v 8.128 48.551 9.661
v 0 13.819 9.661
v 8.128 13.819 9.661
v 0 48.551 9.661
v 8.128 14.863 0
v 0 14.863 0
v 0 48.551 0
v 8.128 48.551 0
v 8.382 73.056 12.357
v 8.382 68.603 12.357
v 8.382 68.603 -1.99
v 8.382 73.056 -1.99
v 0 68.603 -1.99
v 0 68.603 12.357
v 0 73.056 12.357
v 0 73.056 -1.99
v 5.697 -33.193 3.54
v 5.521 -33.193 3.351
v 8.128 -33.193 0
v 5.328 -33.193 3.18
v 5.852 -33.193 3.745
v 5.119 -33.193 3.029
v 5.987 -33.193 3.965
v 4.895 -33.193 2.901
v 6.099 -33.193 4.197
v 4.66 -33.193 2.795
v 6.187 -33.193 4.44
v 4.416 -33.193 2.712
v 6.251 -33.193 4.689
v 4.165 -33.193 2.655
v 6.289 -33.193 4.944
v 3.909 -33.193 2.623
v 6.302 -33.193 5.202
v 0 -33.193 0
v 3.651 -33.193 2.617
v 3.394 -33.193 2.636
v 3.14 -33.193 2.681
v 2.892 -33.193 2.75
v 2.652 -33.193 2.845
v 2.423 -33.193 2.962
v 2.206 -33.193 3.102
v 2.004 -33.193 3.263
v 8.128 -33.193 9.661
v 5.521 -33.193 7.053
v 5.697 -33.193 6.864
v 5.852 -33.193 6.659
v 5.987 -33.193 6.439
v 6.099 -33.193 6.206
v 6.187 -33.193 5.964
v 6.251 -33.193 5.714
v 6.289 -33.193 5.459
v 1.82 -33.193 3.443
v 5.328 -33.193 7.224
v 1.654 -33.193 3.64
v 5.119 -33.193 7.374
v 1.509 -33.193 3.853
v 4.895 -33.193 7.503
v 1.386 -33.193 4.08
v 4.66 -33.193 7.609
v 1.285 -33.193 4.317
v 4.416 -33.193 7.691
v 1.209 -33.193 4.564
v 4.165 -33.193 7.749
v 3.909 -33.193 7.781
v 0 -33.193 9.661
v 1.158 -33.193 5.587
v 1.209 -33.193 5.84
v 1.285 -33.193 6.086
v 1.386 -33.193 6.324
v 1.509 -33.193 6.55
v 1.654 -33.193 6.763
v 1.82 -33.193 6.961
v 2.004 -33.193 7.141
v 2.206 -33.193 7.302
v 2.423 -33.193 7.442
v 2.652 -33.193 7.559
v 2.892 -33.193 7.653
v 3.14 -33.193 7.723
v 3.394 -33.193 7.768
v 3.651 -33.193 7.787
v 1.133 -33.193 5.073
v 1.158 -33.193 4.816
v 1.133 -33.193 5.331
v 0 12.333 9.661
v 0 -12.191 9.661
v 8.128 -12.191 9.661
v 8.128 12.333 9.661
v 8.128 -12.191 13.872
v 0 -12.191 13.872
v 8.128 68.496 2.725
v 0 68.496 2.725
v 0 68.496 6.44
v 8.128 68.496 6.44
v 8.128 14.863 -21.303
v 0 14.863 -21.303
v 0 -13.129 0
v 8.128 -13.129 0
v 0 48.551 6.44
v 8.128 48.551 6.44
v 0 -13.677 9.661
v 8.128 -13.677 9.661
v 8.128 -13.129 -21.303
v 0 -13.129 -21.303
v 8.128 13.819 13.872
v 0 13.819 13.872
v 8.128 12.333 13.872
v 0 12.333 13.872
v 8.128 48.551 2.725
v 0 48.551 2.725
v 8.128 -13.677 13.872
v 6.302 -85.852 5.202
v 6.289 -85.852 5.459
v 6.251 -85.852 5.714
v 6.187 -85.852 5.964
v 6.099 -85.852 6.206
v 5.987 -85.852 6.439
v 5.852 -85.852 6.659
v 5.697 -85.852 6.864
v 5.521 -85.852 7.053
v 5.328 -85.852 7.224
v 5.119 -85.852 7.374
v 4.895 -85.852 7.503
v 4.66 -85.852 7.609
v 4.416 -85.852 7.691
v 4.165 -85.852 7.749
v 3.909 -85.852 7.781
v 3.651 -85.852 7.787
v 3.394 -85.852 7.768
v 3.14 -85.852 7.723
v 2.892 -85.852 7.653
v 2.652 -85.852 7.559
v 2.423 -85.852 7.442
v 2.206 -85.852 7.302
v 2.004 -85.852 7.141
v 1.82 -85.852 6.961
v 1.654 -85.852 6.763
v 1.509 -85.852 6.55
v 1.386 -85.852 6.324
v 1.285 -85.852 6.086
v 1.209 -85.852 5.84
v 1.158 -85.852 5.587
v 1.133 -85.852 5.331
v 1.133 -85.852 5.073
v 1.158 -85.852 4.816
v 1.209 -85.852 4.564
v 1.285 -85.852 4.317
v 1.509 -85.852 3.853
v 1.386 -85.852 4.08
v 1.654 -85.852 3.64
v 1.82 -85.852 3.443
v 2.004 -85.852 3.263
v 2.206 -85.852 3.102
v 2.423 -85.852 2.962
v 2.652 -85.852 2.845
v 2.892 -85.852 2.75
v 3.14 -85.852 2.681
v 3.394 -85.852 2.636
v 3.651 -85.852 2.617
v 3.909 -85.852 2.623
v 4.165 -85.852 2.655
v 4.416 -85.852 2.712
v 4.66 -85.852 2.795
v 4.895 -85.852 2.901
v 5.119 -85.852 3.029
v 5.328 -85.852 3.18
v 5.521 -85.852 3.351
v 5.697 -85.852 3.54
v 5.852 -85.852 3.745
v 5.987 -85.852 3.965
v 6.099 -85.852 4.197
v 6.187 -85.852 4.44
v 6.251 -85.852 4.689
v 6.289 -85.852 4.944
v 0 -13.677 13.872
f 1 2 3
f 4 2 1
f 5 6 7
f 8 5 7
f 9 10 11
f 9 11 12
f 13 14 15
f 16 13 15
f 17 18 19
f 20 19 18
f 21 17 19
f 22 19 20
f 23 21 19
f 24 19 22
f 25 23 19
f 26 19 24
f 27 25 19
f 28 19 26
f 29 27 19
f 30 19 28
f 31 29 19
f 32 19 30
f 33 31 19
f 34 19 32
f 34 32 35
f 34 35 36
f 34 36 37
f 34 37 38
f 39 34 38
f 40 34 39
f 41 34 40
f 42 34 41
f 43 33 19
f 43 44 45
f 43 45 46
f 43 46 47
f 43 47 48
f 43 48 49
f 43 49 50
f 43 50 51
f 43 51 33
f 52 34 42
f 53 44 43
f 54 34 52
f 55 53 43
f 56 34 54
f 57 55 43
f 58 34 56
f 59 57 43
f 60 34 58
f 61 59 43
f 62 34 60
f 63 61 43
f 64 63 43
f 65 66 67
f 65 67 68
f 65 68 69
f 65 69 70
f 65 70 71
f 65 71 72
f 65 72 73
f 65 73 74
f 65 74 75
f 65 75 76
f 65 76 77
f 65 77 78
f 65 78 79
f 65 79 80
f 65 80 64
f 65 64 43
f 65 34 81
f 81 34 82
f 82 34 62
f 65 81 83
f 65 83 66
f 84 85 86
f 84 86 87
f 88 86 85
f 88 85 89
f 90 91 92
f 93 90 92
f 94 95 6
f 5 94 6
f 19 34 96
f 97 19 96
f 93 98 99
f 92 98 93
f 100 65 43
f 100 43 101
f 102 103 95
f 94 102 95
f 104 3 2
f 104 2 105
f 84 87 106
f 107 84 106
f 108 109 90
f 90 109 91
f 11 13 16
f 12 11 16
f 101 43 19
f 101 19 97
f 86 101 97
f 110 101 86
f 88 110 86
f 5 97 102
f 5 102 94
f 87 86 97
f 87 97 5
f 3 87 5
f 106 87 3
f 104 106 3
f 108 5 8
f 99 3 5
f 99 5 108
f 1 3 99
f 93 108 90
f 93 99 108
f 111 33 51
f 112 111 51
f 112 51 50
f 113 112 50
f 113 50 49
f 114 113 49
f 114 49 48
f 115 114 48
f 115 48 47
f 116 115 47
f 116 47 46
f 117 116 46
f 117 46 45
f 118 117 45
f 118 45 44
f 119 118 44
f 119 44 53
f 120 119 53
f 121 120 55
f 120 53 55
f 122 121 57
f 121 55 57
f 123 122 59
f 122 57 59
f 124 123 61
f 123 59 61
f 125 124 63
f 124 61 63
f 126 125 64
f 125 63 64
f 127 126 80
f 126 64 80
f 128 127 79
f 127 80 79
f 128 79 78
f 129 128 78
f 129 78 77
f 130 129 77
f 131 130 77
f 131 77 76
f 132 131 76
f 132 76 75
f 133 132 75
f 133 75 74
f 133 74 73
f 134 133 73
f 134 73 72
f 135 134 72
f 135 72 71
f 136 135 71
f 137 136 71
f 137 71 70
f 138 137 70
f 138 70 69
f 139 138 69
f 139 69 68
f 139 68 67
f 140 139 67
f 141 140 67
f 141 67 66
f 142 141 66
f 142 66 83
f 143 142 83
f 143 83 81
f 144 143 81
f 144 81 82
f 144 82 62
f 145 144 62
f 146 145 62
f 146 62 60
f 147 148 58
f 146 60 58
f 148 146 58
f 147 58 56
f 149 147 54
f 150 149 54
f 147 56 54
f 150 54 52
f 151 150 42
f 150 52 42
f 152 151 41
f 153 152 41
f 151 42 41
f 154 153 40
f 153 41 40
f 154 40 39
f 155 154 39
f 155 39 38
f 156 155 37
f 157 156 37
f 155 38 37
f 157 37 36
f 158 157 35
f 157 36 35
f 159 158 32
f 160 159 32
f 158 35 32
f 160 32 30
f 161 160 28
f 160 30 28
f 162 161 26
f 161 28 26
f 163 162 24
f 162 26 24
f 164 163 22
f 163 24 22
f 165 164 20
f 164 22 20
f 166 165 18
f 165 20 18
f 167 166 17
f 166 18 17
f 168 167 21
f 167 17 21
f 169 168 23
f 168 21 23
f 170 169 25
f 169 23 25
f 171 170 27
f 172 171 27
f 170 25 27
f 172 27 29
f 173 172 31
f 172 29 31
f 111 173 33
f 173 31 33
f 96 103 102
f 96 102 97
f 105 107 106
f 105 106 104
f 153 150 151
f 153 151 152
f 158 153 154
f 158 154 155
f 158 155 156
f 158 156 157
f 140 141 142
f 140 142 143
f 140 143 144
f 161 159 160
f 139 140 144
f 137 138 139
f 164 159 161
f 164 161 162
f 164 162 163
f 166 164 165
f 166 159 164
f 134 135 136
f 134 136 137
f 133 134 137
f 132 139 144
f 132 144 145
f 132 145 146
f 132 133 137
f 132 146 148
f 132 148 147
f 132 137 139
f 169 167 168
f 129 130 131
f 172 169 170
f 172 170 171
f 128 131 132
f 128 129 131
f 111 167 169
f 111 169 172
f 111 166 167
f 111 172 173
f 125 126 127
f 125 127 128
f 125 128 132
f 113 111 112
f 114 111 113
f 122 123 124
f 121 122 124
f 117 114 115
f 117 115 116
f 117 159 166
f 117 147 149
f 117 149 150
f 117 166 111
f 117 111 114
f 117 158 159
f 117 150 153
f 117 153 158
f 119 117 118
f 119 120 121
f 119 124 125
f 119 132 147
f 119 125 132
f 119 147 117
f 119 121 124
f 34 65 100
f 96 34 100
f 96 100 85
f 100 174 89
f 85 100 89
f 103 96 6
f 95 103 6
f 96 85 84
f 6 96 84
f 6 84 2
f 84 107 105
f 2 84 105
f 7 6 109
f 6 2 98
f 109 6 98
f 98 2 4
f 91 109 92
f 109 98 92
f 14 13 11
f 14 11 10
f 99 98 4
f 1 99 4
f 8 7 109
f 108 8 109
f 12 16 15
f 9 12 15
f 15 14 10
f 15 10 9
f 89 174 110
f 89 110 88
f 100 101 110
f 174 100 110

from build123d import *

# Parameters (mm, degrees)
F0_W      = 27.991115
F0_H      = 21.302972
F1_DEPTH  = 8.128
F2_W      = 81.743963
F2_H      = 9.66065
F3_DEPTH  = 8.128
F4_R      = 2.586158
F5_DEPTH  = 85.852
F6_W      = 1.486253
F6_H      = 4.70647
F6_W_2    = 1.486256
F6_H_2    = 4.45876
F7_DEPTH  = 8.128
F8_W      = 20.064421
F8_H      = 3.715635
F9_DEPTH  = 8.128
F10_W     = 4.452333
F10_H     = 14.346389
F11_DEPTH = 8.382


with BuildPart() as f1:
    # F0 (on Right) → F1 (new body)
    with BuildSketch(Plane.YZ):
        with Locations((0.866982, -10.651486)):
            Rectangle(F0_W, F0_H)
    extrude(amount=F1_DEPTH)

    # F2 (on Right) → F3 (join)
    with BuildSketch(Plane.YZ):
        with Locations((7.678978, 4.830325)):
            Rectangle(F2_W, F2_H)
    extrude(amount=F3_DEPTH)

    # F4 (on Front) → F5 (join)
    with BuildSketch(Plane.XZ):
        with Locations((3.715635, 5.201889)):
            Circle(F4_R)
    extrude(amount=F5_DEPTH)

    # F6 (on Right) → F7 (join)
    with BuildSketch(Plane.YZ):
        with Locations((-12.933677, 11.518467)):
            Rectangle(F6_W, F6_H)
        with Locations((13.075766, 11.642322)):
            Rectangle(F6_W_2, F6_H_2)
    extrude(amount=F7_DEPTH)

    # F8 (on Right) → F9 (join)
    with BuildSketch(Plane.YZ):
        with Locations((58.463644, 4.582617)):
            Rectangle(F8_W, F8_H)
    extrude(amount=F9_DEPTH)


with BuildPart() as f11:
    # F10 (on Right) → F11 (new body)
    with BuildSketch(Plane.YZ):
        with Locations((70.82957, 5.183658)):
            Rectangle(F10_W, F10_H)
    extrude(amount=F11_DEPTH)


solid = Compound([f1.part, f11.part])
